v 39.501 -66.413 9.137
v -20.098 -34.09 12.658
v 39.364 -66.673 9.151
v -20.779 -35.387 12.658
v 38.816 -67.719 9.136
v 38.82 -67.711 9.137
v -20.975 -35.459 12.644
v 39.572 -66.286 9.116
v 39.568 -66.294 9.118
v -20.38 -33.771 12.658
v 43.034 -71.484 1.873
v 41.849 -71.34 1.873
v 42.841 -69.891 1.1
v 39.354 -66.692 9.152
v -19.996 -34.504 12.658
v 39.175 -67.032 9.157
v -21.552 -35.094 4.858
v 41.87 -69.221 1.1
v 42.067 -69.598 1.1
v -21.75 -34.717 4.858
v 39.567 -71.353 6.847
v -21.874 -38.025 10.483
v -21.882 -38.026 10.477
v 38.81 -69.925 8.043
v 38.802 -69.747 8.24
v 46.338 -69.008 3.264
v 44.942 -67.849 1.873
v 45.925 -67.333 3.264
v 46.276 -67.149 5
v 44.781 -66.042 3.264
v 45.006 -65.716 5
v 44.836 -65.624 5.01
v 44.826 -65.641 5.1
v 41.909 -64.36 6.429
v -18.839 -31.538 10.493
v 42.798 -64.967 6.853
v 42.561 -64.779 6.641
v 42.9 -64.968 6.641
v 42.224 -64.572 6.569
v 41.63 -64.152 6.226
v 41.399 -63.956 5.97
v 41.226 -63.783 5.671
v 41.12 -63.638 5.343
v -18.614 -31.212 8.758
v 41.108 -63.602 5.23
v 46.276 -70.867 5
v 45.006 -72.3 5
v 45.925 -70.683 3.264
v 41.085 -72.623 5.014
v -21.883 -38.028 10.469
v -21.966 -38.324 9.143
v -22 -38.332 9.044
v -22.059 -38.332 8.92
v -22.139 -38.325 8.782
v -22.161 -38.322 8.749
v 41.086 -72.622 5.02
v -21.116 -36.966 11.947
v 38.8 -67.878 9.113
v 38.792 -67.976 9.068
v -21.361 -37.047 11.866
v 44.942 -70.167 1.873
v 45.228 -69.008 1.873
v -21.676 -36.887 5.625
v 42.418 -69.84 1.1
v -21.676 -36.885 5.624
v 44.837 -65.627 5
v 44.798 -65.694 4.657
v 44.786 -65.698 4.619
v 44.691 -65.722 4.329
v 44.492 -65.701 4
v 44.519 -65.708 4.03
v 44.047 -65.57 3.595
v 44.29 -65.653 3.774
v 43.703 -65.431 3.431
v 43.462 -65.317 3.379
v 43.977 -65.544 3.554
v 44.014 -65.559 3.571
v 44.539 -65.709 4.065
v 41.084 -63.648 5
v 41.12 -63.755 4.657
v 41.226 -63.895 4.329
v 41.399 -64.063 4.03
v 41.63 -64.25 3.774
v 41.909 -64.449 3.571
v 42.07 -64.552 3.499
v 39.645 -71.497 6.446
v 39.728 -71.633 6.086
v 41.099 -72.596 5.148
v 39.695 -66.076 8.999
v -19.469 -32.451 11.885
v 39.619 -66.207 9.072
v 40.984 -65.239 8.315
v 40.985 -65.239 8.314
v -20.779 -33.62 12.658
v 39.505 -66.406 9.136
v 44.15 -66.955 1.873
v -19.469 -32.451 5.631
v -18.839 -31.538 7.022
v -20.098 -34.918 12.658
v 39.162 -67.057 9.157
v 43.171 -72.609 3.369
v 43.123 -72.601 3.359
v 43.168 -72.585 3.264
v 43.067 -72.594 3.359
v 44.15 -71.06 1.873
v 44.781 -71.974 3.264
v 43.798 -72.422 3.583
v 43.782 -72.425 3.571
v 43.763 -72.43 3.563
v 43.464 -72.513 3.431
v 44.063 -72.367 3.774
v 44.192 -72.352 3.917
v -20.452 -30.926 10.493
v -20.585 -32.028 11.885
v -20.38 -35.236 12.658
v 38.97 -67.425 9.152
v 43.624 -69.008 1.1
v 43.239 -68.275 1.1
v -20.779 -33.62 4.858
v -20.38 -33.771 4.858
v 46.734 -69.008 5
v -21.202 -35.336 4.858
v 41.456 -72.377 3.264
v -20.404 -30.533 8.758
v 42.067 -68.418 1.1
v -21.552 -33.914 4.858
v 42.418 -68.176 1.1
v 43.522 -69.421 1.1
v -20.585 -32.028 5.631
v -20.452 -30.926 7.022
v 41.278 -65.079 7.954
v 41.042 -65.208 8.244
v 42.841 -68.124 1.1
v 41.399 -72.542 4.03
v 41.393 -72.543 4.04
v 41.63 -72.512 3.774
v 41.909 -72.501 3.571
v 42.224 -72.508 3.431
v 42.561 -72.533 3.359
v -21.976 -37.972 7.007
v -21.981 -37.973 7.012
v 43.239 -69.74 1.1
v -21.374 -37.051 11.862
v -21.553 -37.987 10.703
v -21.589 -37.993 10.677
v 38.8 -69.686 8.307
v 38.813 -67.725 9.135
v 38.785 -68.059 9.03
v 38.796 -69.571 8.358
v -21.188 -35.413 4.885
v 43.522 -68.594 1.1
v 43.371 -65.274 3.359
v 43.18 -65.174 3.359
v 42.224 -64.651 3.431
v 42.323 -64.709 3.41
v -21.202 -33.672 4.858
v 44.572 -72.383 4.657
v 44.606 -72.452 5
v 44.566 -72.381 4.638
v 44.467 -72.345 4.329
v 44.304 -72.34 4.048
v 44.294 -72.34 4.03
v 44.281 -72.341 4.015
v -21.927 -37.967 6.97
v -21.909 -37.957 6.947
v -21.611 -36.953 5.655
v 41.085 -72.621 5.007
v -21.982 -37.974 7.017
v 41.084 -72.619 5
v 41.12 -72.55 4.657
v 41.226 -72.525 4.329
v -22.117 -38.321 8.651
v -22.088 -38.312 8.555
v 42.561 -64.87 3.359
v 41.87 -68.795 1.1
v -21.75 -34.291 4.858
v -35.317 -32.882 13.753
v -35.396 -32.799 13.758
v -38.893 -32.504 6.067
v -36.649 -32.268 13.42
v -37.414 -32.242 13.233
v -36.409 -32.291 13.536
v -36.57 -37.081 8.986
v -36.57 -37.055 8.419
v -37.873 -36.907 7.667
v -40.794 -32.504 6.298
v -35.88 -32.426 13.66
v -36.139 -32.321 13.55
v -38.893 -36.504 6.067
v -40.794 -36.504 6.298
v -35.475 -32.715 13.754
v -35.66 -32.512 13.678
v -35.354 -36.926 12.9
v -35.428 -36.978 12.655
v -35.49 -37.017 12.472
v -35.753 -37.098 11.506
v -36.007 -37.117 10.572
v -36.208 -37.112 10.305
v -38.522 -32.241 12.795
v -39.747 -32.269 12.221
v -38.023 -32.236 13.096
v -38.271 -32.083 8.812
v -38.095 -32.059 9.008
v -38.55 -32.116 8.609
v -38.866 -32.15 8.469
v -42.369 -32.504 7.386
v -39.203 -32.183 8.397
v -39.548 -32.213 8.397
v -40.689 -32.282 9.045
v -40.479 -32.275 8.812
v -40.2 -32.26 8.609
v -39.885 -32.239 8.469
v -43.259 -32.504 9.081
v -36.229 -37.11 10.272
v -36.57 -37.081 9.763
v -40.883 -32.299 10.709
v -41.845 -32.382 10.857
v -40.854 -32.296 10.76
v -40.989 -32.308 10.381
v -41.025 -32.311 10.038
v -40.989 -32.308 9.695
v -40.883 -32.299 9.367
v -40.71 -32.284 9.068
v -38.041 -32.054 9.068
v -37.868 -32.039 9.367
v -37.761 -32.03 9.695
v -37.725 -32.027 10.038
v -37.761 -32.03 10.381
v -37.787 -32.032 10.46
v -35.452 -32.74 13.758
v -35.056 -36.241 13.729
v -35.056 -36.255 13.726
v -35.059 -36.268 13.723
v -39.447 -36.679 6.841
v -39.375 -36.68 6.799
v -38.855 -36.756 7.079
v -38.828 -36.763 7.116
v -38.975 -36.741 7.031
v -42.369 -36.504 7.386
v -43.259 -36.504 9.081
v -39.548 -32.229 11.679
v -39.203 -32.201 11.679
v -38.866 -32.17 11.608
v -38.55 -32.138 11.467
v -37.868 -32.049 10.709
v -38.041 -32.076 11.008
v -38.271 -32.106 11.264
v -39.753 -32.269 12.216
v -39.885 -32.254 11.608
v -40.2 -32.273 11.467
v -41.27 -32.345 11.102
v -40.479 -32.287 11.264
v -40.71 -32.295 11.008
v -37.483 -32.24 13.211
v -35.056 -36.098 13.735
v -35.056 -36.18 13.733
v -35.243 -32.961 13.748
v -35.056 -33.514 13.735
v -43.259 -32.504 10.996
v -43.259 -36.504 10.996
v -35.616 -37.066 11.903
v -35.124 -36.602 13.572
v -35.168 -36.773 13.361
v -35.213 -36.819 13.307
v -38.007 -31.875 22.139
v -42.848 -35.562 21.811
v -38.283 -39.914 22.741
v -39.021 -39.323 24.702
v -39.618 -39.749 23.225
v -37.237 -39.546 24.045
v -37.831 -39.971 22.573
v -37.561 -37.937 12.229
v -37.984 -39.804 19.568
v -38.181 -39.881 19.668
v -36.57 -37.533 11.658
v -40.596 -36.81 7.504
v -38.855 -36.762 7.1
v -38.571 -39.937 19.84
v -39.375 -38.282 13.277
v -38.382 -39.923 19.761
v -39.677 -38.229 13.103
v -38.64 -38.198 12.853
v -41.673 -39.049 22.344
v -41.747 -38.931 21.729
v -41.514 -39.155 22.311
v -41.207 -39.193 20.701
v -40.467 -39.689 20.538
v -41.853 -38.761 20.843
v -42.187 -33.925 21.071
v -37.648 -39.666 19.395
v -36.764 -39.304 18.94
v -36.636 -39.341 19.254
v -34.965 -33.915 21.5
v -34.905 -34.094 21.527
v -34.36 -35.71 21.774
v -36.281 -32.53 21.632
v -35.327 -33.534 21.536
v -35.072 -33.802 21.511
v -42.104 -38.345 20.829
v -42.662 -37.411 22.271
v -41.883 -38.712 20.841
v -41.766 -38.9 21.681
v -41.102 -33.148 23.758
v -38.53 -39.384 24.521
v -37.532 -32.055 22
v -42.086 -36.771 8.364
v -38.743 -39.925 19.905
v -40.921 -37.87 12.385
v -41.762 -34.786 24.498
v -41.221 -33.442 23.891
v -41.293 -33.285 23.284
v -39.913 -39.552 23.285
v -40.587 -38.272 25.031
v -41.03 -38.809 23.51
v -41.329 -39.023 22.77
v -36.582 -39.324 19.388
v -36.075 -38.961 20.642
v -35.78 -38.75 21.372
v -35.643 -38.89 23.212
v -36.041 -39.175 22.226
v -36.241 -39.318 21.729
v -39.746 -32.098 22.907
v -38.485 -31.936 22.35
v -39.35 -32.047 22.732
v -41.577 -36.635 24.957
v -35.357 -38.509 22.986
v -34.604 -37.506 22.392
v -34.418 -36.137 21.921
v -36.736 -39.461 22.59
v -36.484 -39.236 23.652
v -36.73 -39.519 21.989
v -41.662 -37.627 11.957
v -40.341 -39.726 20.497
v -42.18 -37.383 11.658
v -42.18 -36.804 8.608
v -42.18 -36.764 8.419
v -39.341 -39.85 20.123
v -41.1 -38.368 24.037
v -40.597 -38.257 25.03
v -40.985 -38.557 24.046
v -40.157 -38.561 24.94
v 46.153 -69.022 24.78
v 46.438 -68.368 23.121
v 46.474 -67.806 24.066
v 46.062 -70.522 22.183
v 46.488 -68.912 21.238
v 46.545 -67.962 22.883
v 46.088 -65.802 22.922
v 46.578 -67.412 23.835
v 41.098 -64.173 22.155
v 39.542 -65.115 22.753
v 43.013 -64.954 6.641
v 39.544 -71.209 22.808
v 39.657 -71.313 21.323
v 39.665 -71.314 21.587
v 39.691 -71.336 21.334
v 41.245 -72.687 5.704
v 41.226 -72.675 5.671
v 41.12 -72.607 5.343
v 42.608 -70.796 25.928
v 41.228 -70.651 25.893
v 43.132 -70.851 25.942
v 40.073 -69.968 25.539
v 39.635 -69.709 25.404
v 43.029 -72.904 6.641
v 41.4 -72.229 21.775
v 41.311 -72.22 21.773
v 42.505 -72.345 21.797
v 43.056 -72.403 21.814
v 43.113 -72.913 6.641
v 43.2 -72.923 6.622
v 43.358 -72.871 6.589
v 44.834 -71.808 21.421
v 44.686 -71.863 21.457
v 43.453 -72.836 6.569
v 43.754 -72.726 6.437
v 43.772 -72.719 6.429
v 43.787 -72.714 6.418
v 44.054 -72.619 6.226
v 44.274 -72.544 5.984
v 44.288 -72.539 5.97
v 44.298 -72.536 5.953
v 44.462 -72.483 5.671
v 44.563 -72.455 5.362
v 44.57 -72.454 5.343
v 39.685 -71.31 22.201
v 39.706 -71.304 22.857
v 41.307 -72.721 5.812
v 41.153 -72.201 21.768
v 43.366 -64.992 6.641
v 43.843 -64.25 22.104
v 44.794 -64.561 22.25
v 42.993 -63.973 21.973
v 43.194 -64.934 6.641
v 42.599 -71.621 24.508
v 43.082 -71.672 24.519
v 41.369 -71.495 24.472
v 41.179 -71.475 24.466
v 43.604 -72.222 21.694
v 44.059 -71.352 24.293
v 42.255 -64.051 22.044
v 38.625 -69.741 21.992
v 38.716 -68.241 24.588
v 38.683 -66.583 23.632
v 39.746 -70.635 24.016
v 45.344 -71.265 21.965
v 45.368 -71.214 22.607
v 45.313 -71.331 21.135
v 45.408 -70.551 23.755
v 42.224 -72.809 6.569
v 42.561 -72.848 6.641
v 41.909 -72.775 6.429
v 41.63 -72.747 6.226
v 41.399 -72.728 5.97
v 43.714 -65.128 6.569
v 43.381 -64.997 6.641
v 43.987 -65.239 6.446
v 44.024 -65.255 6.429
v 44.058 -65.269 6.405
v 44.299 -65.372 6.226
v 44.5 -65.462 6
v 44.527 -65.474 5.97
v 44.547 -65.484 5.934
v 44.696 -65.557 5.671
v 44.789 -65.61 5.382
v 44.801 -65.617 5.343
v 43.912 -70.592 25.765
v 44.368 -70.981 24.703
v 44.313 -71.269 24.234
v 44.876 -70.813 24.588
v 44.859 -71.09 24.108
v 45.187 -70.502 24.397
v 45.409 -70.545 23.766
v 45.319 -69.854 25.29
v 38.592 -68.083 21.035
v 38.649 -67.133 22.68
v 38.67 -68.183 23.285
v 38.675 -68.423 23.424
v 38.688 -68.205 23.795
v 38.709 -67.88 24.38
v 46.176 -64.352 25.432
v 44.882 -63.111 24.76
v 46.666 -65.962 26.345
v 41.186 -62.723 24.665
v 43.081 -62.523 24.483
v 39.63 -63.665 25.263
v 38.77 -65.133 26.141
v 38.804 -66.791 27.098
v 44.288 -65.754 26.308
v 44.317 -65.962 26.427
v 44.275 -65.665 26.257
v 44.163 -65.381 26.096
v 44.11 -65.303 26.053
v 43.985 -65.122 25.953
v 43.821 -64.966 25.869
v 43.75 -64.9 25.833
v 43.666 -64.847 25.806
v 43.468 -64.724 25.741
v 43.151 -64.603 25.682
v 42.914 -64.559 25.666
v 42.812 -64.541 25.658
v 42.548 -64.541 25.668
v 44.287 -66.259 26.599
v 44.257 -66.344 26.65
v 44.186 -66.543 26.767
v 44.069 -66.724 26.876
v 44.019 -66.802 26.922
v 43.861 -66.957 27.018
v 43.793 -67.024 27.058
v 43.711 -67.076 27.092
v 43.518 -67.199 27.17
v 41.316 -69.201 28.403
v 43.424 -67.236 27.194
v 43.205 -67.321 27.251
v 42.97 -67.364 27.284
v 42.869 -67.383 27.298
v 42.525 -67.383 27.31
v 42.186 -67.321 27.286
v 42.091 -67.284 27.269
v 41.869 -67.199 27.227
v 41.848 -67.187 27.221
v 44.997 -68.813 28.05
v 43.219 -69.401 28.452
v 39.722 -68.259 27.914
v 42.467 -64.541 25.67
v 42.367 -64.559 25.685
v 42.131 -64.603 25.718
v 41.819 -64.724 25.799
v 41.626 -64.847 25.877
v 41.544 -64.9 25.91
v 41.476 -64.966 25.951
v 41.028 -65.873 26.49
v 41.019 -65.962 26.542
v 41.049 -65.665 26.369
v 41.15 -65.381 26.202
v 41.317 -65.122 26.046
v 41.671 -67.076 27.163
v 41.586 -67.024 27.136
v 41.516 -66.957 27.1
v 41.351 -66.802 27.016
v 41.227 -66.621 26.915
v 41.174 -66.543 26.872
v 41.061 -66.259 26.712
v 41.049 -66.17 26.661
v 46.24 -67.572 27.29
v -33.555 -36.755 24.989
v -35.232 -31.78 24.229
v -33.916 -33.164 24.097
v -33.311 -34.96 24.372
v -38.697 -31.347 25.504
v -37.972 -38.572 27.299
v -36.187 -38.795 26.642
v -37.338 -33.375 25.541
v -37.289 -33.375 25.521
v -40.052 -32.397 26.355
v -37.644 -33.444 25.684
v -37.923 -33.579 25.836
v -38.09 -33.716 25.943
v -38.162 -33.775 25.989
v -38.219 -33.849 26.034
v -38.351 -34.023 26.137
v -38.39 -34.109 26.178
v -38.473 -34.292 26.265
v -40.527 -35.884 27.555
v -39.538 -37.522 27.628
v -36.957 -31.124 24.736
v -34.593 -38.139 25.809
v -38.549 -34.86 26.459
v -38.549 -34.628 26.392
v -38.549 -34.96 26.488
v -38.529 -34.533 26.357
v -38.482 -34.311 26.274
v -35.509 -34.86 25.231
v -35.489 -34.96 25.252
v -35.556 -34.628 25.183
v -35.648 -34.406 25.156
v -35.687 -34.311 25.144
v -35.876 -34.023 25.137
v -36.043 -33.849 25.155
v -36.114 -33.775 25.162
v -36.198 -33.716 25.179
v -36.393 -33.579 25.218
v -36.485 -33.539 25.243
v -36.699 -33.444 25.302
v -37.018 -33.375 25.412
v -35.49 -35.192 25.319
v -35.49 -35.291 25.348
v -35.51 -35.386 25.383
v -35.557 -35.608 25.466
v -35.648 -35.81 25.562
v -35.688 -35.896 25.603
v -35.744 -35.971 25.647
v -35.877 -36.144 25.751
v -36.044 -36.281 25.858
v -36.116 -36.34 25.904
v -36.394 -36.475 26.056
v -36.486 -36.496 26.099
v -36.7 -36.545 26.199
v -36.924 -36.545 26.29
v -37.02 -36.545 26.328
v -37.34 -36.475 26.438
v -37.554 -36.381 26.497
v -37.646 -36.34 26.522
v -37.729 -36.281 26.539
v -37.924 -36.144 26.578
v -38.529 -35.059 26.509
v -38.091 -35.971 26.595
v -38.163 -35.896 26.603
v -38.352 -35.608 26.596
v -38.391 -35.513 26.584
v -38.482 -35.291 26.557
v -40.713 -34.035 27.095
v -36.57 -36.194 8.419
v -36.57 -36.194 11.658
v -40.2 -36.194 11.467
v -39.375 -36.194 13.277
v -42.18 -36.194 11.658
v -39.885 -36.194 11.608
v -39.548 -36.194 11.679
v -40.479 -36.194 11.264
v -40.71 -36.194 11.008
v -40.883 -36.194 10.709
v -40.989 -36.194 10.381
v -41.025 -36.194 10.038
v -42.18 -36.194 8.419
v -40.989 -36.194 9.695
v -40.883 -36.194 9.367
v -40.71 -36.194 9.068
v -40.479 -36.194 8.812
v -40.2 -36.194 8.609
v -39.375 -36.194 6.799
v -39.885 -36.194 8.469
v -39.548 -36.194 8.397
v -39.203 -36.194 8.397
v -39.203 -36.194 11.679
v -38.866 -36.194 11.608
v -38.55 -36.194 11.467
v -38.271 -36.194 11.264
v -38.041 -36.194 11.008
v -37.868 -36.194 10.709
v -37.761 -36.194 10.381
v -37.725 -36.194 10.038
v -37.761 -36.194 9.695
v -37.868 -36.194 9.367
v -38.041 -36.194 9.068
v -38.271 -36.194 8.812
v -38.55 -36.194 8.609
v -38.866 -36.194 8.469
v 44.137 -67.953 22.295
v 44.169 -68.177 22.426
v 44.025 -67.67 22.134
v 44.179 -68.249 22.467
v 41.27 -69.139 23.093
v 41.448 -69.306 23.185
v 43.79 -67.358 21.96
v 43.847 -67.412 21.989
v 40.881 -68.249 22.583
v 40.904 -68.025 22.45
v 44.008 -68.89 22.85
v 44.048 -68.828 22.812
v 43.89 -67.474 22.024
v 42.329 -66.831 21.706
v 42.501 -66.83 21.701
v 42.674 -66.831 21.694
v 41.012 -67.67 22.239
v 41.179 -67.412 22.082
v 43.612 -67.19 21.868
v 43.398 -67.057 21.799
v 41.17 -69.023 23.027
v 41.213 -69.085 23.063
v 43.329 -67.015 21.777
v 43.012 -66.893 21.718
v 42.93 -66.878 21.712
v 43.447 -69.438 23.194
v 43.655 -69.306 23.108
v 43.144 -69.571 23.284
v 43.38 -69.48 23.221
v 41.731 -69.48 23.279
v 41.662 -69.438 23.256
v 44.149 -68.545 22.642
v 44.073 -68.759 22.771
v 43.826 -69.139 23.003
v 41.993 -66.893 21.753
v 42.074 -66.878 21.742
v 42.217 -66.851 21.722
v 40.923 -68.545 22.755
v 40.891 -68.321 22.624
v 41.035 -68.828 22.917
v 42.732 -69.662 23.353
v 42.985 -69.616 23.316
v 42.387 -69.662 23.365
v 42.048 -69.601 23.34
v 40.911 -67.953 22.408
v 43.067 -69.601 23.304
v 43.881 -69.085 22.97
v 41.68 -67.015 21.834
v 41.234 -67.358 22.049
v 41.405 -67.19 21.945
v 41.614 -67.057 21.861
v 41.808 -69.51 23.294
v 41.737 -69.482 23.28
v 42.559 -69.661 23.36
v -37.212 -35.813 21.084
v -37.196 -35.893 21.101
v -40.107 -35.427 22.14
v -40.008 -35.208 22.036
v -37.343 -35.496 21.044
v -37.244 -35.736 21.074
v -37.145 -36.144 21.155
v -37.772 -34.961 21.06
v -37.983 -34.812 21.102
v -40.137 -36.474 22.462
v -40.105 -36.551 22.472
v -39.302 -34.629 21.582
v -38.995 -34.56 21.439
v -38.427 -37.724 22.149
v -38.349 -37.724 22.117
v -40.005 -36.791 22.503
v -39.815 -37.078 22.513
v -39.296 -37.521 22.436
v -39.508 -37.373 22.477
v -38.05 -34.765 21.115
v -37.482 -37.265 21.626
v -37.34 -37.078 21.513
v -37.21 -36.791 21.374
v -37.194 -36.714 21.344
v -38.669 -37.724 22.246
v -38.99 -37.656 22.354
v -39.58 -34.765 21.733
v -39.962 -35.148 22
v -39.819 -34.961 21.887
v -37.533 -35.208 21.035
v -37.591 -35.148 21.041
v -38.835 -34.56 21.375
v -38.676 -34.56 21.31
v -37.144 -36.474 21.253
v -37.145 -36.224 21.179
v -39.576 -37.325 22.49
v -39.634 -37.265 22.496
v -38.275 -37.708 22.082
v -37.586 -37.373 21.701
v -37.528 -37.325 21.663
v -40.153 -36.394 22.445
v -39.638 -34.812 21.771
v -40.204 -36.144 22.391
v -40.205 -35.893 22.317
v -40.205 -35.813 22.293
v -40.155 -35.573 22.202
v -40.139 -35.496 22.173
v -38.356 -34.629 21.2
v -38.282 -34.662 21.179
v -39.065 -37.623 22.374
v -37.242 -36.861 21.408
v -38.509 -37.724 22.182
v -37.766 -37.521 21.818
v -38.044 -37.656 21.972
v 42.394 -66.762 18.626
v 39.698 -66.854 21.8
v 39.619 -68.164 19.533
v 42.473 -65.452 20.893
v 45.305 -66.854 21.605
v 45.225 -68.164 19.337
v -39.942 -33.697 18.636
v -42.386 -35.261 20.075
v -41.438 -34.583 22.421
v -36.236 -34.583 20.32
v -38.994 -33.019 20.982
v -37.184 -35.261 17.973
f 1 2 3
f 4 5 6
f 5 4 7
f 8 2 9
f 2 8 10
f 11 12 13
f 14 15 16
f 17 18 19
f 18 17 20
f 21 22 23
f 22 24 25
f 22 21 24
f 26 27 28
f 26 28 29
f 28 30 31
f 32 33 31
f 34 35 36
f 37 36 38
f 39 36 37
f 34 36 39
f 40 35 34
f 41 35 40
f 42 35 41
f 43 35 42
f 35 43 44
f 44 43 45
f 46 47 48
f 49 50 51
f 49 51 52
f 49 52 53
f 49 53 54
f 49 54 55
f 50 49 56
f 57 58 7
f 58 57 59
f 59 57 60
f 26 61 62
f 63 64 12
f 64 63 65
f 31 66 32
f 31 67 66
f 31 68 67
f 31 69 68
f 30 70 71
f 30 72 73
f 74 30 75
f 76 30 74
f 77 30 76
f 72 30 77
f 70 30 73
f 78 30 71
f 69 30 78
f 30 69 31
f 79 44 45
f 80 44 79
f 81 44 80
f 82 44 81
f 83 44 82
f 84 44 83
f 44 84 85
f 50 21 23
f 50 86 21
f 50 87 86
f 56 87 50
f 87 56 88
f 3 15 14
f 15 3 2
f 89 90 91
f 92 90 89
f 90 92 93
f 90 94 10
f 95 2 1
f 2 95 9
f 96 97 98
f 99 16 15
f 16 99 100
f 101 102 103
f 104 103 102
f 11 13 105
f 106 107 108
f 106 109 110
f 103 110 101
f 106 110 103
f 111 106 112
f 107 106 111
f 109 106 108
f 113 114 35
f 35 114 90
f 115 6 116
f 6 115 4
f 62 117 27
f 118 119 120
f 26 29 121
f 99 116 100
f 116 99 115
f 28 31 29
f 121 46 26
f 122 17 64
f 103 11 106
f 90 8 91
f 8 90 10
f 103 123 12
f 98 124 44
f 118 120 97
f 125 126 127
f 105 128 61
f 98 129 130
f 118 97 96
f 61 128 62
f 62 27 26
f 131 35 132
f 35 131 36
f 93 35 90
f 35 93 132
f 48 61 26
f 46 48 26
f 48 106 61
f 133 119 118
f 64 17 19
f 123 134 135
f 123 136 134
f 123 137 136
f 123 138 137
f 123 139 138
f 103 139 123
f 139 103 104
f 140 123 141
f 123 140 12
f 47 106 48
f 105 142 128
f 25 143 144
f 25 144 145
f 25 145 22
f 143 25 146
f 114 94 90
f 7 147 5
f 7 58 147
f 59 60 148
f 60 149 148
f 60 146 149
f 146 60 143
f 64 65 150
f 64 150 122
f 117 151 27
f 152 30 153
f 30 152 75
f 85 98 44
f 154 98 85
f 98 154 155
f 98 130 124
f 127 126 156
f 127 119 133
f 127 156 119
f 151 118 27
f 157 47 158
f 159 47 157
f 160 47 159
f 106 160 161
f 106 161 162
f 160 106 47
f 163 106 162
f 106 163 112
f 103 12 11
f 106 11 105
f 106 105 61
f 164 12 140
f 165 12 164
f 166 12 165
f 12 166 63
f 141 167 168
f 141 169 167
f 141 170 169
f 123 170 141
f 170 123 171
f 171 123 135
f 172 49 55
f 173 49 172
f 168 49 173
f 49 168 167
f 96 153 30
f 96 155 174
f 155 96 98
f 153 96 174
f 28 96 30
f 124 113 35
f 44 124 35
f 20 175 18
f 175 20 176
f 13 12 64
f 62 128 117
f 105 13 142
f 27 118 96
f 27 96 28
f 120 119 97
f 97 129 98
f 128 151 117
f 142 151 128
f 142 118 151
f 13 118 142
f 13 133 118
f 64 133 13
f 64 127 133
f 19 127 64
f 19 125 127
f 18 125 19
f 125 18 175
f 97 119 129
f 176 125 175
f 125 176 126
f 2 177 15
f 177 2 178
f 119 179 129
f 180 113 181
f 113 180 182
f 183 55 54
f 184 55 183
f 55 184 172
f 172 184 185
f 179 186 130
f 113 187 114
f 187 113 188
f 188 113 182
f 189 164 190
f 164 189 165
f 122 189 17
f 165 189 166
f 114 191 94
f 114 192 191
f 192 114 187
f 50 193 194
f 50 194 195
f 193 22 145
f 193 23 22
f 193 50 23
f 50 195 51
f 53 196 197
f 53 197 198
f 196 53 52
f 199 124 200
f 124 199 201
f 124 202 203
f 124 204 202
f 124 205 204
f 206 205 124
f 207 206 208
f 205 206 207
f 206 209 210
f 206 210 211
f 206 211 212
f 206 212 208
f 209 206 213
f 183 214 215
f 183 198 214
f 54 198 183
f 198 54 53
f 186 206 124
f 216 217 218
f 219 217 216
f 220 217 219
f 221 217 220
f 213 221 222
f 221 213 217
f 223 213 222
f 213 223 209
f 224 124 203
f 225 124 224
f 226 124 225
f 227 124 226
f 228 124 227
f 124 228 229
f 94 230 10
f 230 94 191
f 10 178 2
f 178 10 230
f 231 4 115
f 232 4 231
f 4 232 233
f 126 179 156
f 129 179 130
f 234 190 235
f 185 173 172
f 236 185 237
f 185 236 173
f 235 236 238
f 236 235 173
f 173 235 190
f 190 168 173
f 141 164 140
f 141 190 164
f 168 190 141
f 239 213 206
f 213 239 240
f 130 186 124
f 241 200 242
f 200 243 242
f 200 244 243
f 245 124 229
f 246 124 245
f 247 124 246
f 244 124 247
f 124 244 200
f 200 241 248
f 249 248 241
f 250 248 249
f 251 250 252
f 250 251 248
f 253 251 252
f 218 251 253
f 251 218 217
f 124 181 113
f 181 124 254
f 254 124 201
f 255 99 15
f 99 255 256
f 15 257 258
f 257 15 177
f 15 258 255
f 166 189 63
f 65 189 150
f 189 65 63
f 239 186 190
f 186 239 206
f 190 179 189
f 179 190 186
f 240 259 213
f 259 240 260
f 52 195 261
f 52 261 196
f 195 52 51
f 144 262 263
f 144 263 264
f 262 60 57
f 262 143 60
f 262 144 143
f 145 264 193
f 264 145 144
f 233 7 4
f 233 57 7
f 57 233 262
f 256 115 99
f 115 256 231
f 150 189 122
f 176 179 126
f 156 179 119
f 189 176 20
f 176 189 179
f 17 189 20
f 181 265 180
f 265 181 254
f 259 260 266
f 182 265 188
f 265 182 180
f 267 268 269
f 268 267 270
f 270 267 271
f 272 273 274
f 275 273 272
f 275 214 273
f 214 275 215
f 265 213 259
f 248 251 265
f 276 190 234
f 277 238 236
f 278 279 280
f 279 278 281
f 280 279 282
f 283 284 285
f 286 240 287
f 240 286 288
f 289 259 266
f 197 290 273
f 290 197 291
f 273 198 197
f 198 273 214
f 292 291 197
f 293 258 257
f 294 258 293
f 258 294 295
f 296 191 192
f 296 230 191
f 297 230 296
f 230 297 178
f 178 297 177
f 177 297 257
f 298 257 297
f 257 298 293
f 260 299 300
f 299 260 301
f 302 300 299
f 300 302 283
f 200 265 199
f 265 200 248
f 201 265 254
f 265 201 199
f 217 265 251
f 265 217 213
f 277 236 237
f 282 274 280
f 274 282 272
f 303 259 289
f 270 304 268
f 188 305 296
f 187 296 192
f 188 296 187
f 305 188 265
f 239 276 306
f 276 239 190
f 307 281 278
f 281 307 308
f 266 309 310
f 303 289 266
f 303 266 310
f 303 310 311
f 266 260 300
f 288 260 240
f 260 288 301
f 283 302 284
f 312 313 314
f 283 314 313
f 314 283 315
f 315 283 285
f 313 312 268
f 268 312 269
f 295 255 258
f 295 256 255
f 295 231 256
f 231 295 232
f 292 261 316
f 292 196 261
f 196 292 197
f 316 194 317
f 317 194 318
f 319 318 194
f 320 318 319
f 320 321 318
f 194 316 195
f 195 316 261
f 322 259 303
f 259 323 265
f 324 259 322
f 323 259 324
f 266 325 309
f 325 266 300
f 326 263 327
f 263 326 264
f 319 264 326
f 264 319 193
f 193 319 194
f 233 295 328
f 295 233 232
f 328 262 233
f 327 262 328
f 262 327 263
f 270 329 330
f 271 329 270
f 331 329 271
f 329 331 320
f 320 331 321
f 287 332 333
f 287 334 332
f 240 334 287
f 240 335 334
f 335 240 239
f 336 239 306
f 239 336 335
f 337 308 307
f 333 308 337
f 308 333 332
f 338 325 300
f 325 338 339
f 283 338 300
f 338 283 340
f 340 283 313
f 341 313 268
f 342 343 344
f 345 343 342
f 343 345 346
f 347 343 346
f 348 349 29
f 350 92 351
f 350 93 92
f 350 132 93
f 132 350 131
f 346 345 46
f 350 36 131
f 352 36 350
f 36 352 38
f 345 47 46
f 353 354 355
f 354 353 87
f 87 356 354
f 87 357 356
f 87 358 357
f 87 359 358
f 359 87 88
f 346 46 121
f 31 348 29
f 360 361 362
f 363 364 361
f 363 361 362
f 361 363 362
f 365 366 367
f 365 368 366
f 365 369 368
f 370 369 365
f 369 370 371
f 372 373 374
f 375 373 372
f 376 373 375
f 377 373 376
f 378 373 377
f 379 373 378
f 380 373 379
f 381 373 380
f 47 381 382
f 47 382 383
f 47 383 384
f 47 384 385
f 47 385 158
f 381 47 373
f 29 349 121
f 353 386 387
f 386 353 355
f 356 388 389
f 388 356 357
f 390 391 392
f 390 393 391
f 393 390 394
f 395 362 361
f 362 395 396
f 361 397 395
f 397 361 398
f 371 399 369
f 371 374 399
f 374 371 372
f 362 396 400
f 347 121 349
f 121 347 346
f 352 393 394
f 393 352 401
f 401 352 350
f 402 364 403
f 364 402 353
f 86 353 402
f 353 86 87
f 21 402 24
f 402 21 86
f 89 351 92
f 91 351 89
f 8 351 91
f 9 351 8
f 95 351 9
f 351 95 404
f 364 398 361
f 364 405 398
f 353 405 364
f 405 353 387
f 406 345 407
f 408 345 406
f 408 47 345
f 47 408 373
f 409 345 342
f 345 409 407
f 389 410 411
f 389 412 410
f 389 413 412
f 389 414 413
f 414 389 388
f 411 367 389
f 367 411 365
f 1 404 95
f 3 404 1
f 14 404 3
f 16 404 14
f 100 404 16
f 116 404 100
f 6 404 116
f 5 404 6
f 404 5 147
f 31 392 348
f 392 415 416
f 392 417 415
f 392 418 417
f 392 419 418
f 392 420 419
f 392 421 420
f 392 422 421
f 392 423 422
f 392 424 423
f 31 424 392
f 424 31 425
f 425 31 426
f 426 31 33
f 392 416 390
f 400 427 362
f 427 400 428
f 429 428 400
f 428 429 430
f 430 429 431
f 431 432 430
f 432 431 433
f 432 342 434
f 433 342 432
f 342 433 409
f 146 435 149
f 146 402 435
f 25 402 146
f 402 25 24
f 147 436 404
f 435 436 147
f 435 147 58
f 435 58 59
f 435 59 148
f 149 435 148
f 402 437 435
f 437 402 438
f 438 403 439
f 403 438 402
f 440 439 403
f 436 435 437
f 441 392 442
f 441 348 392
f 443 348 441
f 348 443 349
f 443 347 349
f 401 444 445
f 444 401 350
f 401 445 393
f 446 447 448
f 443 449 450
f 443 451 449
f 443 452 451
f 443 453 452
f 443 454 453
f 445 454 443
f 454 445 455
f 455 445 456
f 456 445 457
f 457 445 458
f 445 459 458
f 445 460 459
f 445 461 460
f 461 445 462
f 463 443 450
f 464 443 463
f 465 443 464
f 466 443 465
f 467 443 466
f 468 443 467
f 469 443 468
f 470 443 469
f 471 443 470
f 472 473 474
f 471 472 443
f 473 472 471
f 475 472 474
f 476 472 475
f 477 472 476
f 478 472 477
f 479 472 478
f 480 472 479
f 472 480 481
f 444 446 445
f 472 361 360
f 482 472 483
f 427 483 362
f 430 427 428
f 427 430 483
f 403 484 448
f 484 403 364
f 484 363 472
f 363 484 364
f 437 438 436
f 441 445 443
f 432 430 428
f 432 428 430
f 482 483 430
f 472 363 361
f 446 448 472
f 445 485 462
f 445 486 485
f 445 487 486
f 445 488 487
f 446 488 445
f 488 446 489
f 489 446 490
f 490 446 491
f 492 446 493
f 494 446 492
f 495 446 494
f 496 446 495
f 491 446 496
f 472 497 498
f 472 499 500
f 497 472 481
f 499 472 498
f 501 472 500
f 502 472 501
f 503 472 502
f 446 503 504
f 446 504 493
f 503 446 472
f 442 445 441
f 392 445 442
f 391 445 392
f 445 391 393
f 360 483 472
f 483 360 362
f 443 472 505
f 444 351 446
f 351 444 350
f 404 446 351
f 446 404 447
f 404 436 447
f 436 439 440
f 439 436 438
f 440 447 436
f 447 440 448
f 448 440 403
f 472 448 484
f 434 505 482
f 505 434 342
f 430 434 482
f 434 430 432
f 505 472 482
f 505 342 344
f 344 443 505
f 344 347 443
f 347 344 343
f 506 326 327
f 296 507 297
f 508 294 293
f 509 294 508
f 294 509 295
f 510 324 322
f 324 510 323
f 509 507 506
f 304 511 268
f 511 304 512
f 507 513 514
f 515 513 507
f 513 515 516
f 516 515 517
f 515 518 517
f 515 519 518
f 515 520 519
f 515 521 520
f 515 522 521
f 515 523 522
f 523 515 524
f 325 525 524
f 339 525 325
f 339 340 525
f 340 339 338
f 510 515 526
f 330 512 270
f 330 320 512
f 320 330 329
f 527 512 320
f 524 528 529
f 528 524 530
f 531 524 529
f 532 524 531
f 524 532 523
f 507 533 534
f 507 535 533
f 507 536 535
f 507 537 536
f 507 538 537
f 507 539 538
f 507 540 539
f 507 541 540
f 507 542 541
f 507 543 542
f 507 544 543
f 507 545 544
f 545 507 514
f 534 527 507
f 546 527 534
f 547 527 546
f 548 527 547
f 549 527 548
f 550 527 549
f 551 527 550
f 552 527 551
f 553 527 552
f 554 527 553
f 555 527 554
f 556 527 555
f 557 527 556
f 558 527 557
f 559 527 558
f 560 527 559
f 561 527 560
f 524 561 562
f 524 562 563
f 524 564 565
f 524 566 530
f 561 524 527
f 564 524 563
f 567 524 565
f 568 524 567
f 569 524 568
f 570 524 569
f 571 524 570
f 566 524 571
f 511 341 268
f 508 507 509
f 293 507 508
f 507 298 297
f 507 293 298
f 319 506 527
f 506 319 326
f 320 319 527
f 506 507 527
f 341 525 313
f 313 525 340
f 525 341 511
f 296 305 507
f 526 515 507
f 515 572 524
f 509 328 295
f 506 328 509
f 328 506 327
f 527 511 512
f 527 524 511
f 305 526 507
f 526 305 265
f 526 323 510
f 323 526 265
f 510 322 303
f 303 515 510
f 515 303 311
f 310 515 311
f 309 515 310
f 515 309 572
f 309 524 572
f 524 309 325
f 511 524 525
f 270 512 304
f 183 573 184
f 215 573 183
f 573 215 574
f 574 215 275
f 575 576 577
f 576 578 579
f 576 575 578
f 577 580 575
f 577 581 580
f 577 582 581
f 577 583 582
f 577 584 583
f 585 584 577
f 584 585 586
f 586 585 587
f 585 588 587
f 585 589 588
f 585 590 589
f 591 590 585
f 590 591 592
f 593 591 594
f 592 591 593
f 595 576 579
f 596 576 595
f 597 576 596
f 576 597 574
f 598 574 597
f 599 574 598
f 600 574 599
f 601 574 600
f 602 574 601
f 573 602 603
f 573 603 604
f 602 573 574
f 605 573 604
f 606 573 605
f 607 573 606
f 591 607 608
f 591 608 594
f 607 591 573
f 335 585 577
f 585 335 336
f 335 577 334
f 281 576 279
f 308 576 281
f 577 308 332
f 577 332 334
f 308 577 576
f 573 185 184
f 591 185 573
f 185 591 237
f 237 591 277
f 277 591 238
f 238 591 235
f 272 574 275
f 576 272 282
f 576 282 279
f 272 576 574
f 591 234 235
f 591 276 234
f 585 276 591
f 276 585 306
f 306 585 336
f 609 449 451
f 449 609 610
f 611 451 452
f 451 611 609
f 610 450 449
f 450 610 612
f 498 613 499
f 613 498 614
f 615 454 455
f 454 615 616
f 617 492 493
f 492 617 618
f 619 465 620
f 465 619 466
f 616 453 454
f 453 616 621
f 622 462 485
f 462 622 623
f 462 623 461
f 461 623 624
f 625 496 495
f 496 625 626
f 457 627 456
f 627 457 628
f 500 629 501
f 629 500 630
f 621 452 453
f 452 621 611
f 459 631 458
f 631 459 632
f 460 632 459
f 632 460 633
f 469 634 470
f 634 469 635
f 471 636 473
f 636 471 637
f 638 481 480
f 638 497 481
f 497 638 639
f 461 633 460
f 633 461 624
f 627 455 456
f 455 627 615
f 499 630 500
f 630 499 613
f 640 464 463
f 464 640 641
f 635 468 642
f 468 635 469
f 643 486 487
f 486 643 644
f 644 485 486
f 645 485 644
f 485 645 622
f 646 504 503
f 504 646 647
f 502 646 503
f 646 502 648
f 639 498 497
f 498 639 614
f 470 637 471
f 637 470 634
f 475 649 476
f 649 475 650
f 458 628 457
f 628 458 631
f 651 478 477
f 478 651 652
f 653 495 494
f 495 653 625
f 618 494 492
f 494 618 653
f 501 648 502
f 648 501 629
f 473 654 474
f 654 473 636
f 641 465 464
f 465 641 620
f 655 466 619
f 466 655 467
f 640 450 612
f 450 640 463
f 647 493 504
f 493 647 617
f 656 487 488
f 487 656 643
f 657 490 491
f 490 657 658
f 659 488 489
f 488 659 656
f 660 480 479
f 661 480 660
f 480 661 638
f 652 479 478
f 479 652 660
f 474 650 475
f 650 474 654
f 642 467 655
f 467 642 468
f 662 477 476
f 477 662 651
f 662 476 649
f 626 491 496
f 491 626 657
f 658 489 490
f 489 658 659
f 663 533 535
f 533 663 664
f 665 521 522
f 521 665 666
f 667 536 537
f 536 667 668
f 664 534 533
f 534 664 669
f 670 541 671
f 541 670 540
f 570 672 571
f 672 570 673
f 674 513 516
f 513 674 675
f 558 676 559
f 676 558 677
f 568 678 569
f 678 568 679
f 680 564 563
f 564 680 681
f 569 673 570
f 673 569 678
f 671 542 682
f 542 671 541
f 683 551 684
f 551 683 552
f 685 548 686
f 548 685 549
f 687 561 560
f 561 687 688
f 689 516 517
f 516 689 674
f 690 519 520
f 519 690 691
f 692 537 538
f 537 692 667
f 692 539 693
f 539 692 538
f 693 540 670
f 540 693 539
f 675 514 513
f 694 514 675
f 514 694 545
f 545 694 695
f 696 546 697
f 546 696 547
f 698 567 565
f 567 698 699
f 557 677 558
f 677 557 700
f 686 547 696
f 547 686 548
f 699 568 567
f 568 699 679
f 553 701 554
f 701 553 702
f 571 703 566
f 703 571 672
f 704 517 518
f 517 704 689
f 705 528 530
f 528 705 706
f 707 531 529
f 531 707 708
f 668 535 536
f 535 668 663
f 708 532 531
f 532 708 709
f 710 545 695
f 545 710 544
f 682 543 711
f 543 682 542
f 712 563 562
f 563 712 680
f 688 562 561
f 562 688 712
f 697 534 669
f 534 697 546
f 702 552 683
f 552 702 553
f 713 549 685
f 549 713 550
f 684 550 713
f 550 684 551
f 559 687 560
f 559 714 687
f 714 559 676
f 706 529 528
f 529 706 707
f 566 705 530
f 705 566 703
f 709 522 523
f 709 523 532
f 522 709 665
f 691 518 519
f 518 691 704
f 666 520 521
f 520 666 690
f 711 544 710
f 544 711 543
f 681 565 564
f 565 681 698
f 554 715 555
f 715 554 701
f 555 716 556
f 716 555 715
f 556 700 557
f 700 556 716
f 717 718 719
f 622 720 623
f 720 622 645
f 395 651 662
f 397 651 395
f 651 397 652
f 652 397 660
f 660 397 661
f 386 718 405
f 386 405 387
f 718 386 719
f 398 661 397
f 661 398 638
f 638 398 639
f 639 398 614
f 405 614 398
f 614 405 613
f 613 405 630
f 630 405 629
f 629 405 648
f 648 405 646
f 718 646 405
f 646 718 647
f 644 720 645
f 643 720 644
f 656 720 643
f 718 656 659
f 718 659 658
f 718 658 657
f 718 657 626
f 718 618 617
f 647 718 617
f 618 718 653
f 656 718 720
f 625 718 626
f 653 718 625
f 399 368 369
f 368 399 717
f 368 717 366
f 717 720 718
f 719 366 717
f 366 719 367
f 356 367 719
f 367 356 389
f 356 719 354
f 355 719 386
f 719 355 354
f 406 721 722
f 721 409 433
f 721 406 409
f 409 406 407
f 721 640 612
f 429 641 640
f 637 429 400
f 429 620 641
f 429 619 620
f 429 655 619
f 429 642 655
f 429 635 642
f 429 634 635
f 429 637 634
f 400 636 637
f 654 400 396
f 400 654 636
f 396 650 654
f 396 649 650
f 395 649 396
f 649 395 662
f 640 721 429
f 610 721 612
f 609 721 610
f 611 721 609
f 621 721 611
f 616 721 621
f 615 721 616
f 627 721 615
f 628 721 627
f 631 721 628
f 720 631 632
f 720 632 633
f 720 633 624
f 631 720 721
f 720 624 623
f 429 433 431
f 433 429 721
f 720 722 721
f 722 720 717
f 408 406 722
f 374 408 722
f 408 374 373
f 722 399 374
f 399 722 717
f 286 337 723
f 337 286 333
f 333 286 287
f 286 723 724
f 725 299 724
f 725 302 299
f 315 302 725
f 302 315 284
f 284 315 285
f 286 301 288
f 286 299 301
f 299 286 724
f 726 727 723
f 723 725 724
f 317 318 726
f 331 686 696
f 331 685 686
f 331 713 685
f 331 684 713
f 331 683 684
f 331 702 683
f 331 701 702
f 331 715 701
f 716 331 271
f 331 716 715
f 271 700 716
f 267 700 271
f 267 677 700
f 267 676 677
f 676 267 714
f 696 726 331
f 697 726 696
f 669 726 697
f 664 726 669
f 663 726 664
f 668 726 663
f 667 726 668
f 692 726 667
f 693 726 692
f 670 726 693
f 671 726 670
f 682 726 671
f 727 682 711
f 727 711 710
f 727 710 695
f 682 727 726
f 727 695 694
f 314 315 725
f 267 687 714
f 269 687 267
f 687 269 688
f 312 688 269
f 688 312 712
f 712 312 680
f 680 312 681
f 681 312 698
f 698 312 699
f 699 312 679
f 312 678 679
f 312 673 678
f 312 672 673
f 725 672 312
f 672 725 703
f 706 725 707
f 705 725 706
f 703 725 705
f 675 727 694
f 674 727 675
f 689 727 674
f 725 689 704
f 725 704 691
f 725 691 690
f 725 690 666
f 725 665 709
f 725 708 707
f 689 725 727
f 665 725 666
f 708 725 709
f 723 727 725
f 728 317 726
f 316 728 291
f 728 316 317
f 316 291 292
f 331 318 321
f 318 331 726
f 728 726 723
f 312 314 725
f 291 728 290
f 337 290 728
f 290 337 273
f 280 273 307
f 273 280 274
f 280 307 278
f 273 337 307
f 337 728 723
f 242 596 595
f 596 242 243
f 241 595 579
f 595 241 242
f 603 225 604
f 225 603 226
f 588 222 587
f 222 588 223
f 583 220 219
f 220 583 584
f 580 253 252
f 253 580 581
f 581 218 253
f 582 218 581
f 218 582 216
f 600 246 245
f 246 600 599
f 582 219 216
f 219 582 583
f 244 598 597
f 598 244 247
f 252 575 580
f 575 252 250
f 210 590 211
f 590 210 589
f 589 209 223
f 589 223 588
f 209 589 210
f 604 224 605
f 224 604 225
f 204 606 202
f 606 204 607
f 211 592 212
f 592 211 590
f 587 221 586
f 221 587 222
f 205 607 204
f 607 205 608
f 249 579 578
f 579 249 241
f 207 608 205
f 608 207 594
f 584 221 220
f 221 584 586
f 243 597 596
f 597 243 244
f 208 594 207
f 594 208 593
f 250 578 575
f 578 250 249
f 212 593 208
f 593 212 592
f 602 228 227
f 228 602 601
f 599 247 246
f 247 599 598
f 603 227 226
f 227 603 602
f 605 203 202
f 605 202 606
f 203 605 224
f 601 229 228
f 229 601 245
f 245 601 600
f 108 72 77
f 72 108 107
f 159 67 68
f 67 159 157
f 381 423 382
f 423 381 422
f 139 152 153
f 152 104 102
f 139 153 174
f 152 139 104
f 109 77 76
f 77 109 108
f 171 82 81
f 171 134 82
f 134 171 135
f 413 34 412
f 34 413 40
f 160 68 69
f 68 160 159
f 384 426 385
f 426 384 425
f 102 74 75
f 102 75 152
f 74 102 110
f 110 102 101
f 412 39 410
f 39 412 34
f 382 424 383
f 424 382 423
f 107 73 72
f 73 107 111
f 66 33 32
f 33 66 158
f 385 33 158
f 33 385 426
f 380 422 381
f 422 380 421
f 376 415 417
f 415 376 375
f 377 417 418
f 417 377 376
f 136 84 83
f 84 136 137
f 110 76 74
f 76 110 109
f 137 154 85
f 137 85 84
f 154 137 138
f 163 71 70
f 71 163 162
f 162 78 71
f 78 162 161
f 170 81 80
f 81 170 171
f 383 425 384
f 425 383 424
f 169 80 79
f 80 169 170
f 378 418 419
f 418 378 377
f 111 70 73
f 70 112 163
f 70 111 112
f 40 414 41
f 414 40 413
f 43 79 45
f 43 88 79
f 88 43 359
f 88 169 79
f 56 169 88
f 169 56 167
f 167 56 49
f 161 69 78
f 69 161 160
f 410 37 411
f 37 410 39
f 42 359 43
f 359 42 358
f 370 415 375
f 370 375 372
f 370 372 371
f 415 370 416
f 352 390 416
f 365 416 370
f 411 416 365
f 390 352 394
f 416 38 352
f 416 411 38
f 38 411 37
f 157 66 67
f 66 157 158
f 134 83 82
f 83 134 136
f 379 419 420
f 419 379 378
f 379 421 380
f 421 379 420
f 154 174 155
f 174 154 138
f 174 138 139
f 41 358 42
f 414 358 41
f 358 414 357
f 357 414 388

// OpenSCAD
difference () {
  union () {
    hull () {
      translate ([42.73373313209089, -69.0078112269751, 5.0]) {
        sphere (r=4);
      }
      translate ([0, 0, 8]) {
        rotate (a=12.0, v=[0, 1, 0]) {
          translate ([0, -12, 5.64]) {
            translate ([0, 0, 236.2124823694608]) {
              rotate (a=-10.0, v=[0, 1, 0]) {
                translate ([0, 0, -236.2124823694608]) {
                  translate ([0, 0, 84.31095110414394]) {
                    rotate (a=-29.999999999999996, v=[1, 0, 0]) {
                      translate ([0, 0, -84.31095110414394]) {
                        translate ([0, 0, -4.5]) {
                          translate ([0, -13.575, 0]) {
                            cylinder (h=3, r=4, center=true);
                          }
                        }
                      }
                    }
                  }
                }
              }
            }
          }
        }
      }
    }
    translate ([0, 0, 8]) {
      rotate (a=12.0, v=[0, 1, 0]) {
        translate ([0, -12, 5.64]) {
          translate ([0, 0, 236.2124823694608]) {
            rotate (a=-10.0, v=[0, 1, 0]) {
              translate ([0, 0, -236.2124823694608]) {
                translate ([0, 0, 84.31095110414394]) {
                  rotate (a=-29.999999999999996, v=[1, 0, 0]) {
                    translate ([0, 0, -84.31095110414394]) {
                      translate ([0, 0, -2.0999999999999996]) {
                        translate ([0, -13.575, 0]) {
                          cylinder (h=4, r=4, center=true);
                        }
                      }
                    }
                  }
                }
              }
            }
          }
        }
      }
    }


    union () {
      hull () {
        translate ([42.73373313209089, -69.0078112269751, 5.0]) {
          sphere (r=4);
        }
        translate ([-20.8861121541338, -34.50390561348755, 8.757888382012283]) {
          sphere (r=4);
        }
      }
      hull () {
        translate ([-20.8861121541338, -34.50390561348755, 8.757888382012283]) {
          sphere (r=4);
        }
        translate ([-39.37541674104513, -34.50390561348755, 10.038272992958468]) {
          rotate (a=90.0, v=[1, 0, 0]) {
            cylinder (h=4, r=4, center=true);
          }
        }
      }
      hull () {
        translate ([-39.37541674104513, -34.50390561348755, 10.038272992958468]) {
          rotate (a=90.0, v=[1, 0, 0]) {
            cylinder (h=4, r=4, center=true);
          }
        }
        translate ([0, 0, 8]) {
          rotate (a=12.0, v=[0, 1, 0]) {
            translate ([0, 0, 0]) {
              translate ([0, 0, 236.2124823694608]) {
                rotate (a=10.0, v=[0, 1, 0]) {
                  translate ([0, 0, -236.2124823694608]) {
                    translate ([0, 0, 84.31095110414394]) {
                      rotate (a=-14.999999999999998, v=[1, 0, 0]) {
                        translate ([0, 0, -84.31095110414394]) {
                          translate ([0, 0, -4.5]) {
                            translate ([0, -13.575, 0]) {
                              cylinder (h=3, r=4, center=true);
                            }
                          }
                        }
                      }
                    }
                  }
                }
              }
            }
          }
        }
      }
    }
    translate ([0, 0, 8]) {
      rotate (a=12.0, v=[0, 1, 0]) {
        translate ([0, 0, 0]) {
          translate ([0, 0, 236.2124823694608]) {
            rotate (a=10.0, v=[0, 1, 0]) {
              translate ([0, 0, -236.2124823694608]) {
                translate ([0, 0, 84.31095110414394]) {
                  rotate (a=-14.999999999999998, v=[1, 0, 0]) {
                    translate ([0, 0, -84.31095110414394]) {
                      translate ([0, 0, -2.0999999999999996]) {
                        translate ([0, -13.575, 0]) {
                          cylinder (h=4, r=4, center=true);
                        }
                      }
                    }
                  }
                }
              }
            }
          }
        }
      }
    }
  }
  union () {
    translate ([0, 0, 8]) {
      rotate (a=12.0, v=[0, 1, 0]) {
        translate ([0, -12, 5.64]) {
          translate ([0, 0, 236.2124823694608]) {
            rotate (a=-10.0, v=[0, 1, 0]) {
              translate ([0, 0, -236.2124823694608]) {
                translate ([0, 0, 84.31095110414394]) {
                  rotate (a=-29.999999999999996, v=[1, 0, 0]) {
                    translate ([0, 0, -84.31095110414394]) {
                      translate ([0, 0, -2.0999999999999996]) {
                        translate ([0, -13.575, 0]) {
                          cylinder ($fn=30, h=10, r=1.65, center=true);
                        }
                      }
                    }
                  }
                }
              }
            }
          }
        }
      }
    }
    translate ([0, 0, 8]) {
      rotate (a=12.0, v=[0, 1, 0]) {
        translate ([0, -12, 5.64]) {
          translate ([0, 0, 236.2124823694608]) {
            rotate (a=-10.0, v=[0, 1, 0]) {
              translate ([0, 0, -236.2124823694608]) {
                translate ([0, 0, 84.31095110414394]) {
                  rotate (a=29.999999999999996, v=[1, 0, 0]) {
                    translate ([3.8625, 0, -84.31095110414394]) {
                      translate ([0, 0, -2.0999999999999996]) {
                        translate ([0, 13.575, 0]) {
                          cylinder ($fn=30, h=10, r=1.65, center=true);
                        }
                      }
                    }
                  }
                }
              }
            }
          }
        }
      }
    }
    translate ([0, 0, 8]) {
      rotate (a=12.0, v=[0, 1, 0]) {
        translate ([0, -2, 0]) {
          translate ([0, 0, 236.2124823694608]) {
            rotate (a=20.0, v=[0, 1, 0]) {
              translate ([0, 0, -236.2124823694608]) {
                translate ([0, 0, 84.31095110414394]) {
                  rotate (a=29.999999999999996, v=[1, 0, 0]) {
                    translate ([0, 0, -84.31095110414394]) {
                      translate ([0, 0, -2.0999999999999996]) {
                        translate ([0, 13.575, 0]) {
                          cylinder ($fn=30, h=10, r=1.65, center=true);
                        }
                      }
                    }
                  }
                }
              }
            }
          }
        }
      }
    }
    translate ([0, 0, 8]) {
      rotate (a=12.0, v=[0, 1, 0]) {
        translate ([0, 0, 0]) {
          translate ([0, 0, 236.2124823694608]) {
            rotate (a=10.0, v=[0, 1, 0]) {
              translate ([0, 0, -236.2124823694608]) {
                translate ([0, 0, 84.31095110414394]) {
                  rotate (a=-14.999999999999998, v=[1, 0, 0]) {
                    translate ([0, 0, -84.31095110414394]) {
                      translate ([0, 0, -2.0999999999999996]) {
                        translate ([0, -13.575, 0]) {
                          cylinder ($fn=30, h=10, r=1.65, center=true);
                        }
                      }
                    }
                  }
                }
              }
            }
          }
        }
      }
    }
    translate ([0, 0, 8]) {
      rotate (a=12.0, v=[0, 1, 0]) {
        translate ([0, -12, 5.64]) {
          translate ([0, 0, 236.2124823694608]) {
            rotate (a=-10.0, v=[0, 1, 0]) {
              translate ([0, 0, -236.2124823694608]) {
                translate ([0, 0, 84.31095110414394]) {
                  rotate (a=29.999999999999996, v=[1, 0, 0]) {
                    translate ([3.8625, 0, -84.31095110414394]) {
                      hull () {
                        translate ([0, 0, -6]) {
                          translate ([0, 28.575, 0]) {
                            union () {
                              cube ([5.81, 3.3544050639917264, 2.82], center=true);
                              rotate (a=59.99999999999999, v=[0, 0, 1]) {
                                cube ([5.81, 3.3544050639917264, 2.82], center=true);
                              }
                              rotate (a=-59.99999999999999, v=[0, 0, 1]) {
                                cube ([5.81, 3.3544050639917264, 2.82], center=true);
                              }
                            }
                          }
                        }
                        translate ([0, 0, -6]) {
                          translate ([0, 13.575, 0]) {
                            union () {
                              cube ([5.609999999999999, 3.238935010153801, 2.6199999999999997], center=true);
                              rotate (a=59.99999999999999, v=[0, 0, 1]) {
                                cube ([5.609999999999999, 3.238935010153801, 2.6199999999999997], center=true);
                              }
                              rotate (a=-59.99999999999999, v=[0, 0, 1]) {
                                cube ([5.609999999999999, 3.238935010153801, 2.6199999999999997], center=true);
                              }
                            }
                          }
                        }
                      }
                    }
                  }
                }
              }
            }
          }
        }
      }
    }
    translate ([0, 0, 8]) {
      rotate (a=12.0, v=[0, 1, 0]) {
        translate ([0, -12, 5.64]) {
          translate ([0, 0, 236.2124823694608]) {
            rotate (a=-10.0, v=[0, 1, 0]) {
              translate ([0, 0, -236.2124823694608]) {
                translate ([0, 0, 84.31095110414394]) {
                  rotate (a=-29.999999999999996, v=[1, 0, 0]) {
                    translate ([0, 0, -84.31095110414394]) {
                      hull () {
                        translate ([0, 0, -6]) {
                          translate ([0, -28.575, 0]) {
                            union () {
                              cube ([5.81, 3.3544050639917264, 2.82], center=true);
                              rotate (a=59.99999999999999, v=[0, 0, 1]) {
                                cube ([5.81, 3.3544050639917264, 2.82], center=true);
                              }
                              rotate (a=-59.99999999999999, v=[0, 0, 1]) {
                                cube ([5.81, 3.3544050639917264, 2.82], center=true);
                              }
                            }
                          }
                        }
                        translate ([0, 0, -6]) {
                          translate ([0, -13.575, 0]) {
                            union () {
                              cube ([5.609999999999999, 3.238935010153801, 2.6199999999999997], center=true);
                              rotate (a=59.99999999999999, v=[0, 0, 1]) {
                                cube ([5.609999999999999, 3.238935010153801, 2.6199999999999997], center=true);
                              }
                              rotate (a=-59.99999999999999, v=[0, 0, 1]) {
                                cube ([5.609999999999999, 3.238935010153801, 2.6199999999999997], center=true);
                              }
                            }
                          }
                        }
                      }
                    }
                  }
                }
              }
            }
          }
        }
      }
    }
    translate ([0, 0, 8]) {
      rotate (a=12.0, v=[0, 1, 0]) {
        translate ([0, -2, 0]) {
          translate ([0, 0, 236.2124823694608]) {
            rotate (a=20.0, v=[0, 1, 0]) {
              translate ([0, 0, -236.2124823694608]) {
                translate ([0, 0, 84.31095110414394]) {
                  rotate (a=29.999999999999996, v=[1, 0, 0]) {
                    translate ([0, 0, -84.31095110414394]) {
                      hull () {
                        translate ([0, 0, -6]) {
                          translate ([0, 28.575, 0]) {
                            union () {
                              cube ([5.81, 3.3544050639917264, 2.82], center=true);
                              rotate (a=59.99999999999999, v=[0, 0, 1]) {
                                cube ([5.81, 3.3544050639917264, 2.82], center=true);
                              }
                              rotate (a=-59.99999999999999, v=[0, 0, 1]) {
                                cube ([5.81, 3.3544050639917264, 2.82], center=true);
                              }
                            }
                          }
                        }
                        translate ([0, 0, -6]) {
                          translate ([0, 13.575, 0]) {
                            union () {
                              cube ([5.609999999999999, 3.238935010153801, 2.6199999999999997], center=true);
                              rotate (a=59.99999999999999, v=[0, 0, 1]) {
                                cube ([5.609999999999999, 3.238935010153801, 2.6199999999999997], center=true);
                              }
                              rotate (a=-59.99999999999999, v=[0, 0, 1]) {
                                cube ([5.609999999999999, 3.238935010153801, 2.6199999999999997], center=true);
                              }
                            }
                          }
                        }
                      }
                    }
                  }
                }
              }
            }
          }
        }
      }
    }
    translate ([0, 0, 8]) {
      rotate (a=12.0, v=[0, 1, 0]) {
        translate ([0, 0, 0]) {
          translate ([0, 0, 236.2124823694608]) {
            rotate (a=10.0, v=[0, 1, 0]) {
              translate ([0, 0, -236.2124823694608]) {
                translate ([0, 0, 84.31095110414394]) {
                  rotate (a=-14.999999999999998, v=[1, 0, 0]) {
                    translate ([0, 0, -84.31095110414394]) {
                      hull () {
                        translate ([0, 0, -6]) {
                          translate ([0, -28.575, 0]) {
                            union () {
                              cube ([5.81, 3.3544050639917264, 2.82], center=true);
                              rotate (a=59.99999999999999, v=[0, 0, 1]) {
                                cube ([5.81, 3.3544050639917264, 2.82], center=true);
                              }
                              rotate (a=-59.99999999999999, v=[0, 0, 1]) {
                                cube ([5.81, 3.3544050639917264, 2.82], center=true);
                              }
                            }
                          }
                        }
                        translate ([0, 0, -6]) {
                          translate ([0, -13.575, 0]) {
                            union () {
                              cube ([5.609999999999999, 3.238935010153801, 2.6199999999999997], center=true);
                              rotate (a=59.99999999999999, v=[0, 0, 1]) {
                                cube ([5.609999999999999, 3.238935010153801, 2.6199999999999997], center=true);
                              }
                              rotate (a=-59.99999999999999, v=[0, 0, 1]) {
                                cube ([5.609999999999999, 3.238935010153801, 2.6199999999999997], center=true);
                              }
                            }
                          }
                        }
                      }
                    }
                  }
                }
              }
            }
          }
        }
      }
    }
    translate ([0, 2, 0]) {
      translate ([-39.37541674104513, 45.007811226975086, 20.03827299295847]) {
        rotate (a=90.0, v=[1, 0, 0]) {
          union () {
            cube ([5.609999999999999, 3.238935010153801, 2.6199999999999997], center=true);
            rotate (a=59.99999999999999, v=[0, 0, 1]) {
              cube ([5.609999999999999, 3.238935010153801, 2.6199999999999997], center=true);
            }
            rotate (a=-59.99999999999999, v=[0, 0, 1]) {
              cube ([5.609999999999999, 3.238935010153801, 2.6199999999999997], center=true);
            }
          }
        }
      }
    }
    translate ([0, -3.0, 0]) {
      translate ([-39.37541674104513, -34.50390561348755, 10.038272992958468]) {
        rotate (a=-90.0, v=[1, 0, 0]) {
          union () {
            cube ([5.609999999999999, 3.238935010153801, 2.6199999999999997], center=true);
            rotate (a=59.99999999999999, v=[0, 0, 1]) {
              cube ([5.609999999999999, 3.238935010153801, 2.6199999999999997], center=true);
            }
            rotate (a=-59.99999999999999, v=[0, 0, 1]) {
              cube ([5.609999999999999, 3.238935010153801, 2.6199999999999997], center=true);
            }
          }
        }
      }
    }
    hull () {
      translate ([-39.37541674104513, 45.007811226975086, 20.03827299295847]) {
        rotate (a=90.0, v=[1, 0, 0]) {
          cylinder ($fn=30, h=20, r=1.65, center=true);
        }
      }
  } hull() {
      translate ([-39.37541674104513, -34.50390561348755, 10.038272992958468]) {
        rotate (a=90.0, v=[1, 0, 0]) {
          cylinder ($fn=30, h=20, r=1.65, center=true);
        }
      }
    }
    hull () {
      translate ([46.59388020145215, 45.007811226975086, 5.0]) {
        rotate (a=90.0, v=[1, 0, 0]) {
          cylinder ($fn=30, h=20, r=1.65, center=true);
        }
      }
      translate ([42.73373313209089, -69.0078112269751, 5.0]) {
        rotate (a=90.0, v=[1, 0, 0]) {
          cylinder ($fn=30, h=20, r=1.65, center=true);
        }
      }
    }
  }
}
